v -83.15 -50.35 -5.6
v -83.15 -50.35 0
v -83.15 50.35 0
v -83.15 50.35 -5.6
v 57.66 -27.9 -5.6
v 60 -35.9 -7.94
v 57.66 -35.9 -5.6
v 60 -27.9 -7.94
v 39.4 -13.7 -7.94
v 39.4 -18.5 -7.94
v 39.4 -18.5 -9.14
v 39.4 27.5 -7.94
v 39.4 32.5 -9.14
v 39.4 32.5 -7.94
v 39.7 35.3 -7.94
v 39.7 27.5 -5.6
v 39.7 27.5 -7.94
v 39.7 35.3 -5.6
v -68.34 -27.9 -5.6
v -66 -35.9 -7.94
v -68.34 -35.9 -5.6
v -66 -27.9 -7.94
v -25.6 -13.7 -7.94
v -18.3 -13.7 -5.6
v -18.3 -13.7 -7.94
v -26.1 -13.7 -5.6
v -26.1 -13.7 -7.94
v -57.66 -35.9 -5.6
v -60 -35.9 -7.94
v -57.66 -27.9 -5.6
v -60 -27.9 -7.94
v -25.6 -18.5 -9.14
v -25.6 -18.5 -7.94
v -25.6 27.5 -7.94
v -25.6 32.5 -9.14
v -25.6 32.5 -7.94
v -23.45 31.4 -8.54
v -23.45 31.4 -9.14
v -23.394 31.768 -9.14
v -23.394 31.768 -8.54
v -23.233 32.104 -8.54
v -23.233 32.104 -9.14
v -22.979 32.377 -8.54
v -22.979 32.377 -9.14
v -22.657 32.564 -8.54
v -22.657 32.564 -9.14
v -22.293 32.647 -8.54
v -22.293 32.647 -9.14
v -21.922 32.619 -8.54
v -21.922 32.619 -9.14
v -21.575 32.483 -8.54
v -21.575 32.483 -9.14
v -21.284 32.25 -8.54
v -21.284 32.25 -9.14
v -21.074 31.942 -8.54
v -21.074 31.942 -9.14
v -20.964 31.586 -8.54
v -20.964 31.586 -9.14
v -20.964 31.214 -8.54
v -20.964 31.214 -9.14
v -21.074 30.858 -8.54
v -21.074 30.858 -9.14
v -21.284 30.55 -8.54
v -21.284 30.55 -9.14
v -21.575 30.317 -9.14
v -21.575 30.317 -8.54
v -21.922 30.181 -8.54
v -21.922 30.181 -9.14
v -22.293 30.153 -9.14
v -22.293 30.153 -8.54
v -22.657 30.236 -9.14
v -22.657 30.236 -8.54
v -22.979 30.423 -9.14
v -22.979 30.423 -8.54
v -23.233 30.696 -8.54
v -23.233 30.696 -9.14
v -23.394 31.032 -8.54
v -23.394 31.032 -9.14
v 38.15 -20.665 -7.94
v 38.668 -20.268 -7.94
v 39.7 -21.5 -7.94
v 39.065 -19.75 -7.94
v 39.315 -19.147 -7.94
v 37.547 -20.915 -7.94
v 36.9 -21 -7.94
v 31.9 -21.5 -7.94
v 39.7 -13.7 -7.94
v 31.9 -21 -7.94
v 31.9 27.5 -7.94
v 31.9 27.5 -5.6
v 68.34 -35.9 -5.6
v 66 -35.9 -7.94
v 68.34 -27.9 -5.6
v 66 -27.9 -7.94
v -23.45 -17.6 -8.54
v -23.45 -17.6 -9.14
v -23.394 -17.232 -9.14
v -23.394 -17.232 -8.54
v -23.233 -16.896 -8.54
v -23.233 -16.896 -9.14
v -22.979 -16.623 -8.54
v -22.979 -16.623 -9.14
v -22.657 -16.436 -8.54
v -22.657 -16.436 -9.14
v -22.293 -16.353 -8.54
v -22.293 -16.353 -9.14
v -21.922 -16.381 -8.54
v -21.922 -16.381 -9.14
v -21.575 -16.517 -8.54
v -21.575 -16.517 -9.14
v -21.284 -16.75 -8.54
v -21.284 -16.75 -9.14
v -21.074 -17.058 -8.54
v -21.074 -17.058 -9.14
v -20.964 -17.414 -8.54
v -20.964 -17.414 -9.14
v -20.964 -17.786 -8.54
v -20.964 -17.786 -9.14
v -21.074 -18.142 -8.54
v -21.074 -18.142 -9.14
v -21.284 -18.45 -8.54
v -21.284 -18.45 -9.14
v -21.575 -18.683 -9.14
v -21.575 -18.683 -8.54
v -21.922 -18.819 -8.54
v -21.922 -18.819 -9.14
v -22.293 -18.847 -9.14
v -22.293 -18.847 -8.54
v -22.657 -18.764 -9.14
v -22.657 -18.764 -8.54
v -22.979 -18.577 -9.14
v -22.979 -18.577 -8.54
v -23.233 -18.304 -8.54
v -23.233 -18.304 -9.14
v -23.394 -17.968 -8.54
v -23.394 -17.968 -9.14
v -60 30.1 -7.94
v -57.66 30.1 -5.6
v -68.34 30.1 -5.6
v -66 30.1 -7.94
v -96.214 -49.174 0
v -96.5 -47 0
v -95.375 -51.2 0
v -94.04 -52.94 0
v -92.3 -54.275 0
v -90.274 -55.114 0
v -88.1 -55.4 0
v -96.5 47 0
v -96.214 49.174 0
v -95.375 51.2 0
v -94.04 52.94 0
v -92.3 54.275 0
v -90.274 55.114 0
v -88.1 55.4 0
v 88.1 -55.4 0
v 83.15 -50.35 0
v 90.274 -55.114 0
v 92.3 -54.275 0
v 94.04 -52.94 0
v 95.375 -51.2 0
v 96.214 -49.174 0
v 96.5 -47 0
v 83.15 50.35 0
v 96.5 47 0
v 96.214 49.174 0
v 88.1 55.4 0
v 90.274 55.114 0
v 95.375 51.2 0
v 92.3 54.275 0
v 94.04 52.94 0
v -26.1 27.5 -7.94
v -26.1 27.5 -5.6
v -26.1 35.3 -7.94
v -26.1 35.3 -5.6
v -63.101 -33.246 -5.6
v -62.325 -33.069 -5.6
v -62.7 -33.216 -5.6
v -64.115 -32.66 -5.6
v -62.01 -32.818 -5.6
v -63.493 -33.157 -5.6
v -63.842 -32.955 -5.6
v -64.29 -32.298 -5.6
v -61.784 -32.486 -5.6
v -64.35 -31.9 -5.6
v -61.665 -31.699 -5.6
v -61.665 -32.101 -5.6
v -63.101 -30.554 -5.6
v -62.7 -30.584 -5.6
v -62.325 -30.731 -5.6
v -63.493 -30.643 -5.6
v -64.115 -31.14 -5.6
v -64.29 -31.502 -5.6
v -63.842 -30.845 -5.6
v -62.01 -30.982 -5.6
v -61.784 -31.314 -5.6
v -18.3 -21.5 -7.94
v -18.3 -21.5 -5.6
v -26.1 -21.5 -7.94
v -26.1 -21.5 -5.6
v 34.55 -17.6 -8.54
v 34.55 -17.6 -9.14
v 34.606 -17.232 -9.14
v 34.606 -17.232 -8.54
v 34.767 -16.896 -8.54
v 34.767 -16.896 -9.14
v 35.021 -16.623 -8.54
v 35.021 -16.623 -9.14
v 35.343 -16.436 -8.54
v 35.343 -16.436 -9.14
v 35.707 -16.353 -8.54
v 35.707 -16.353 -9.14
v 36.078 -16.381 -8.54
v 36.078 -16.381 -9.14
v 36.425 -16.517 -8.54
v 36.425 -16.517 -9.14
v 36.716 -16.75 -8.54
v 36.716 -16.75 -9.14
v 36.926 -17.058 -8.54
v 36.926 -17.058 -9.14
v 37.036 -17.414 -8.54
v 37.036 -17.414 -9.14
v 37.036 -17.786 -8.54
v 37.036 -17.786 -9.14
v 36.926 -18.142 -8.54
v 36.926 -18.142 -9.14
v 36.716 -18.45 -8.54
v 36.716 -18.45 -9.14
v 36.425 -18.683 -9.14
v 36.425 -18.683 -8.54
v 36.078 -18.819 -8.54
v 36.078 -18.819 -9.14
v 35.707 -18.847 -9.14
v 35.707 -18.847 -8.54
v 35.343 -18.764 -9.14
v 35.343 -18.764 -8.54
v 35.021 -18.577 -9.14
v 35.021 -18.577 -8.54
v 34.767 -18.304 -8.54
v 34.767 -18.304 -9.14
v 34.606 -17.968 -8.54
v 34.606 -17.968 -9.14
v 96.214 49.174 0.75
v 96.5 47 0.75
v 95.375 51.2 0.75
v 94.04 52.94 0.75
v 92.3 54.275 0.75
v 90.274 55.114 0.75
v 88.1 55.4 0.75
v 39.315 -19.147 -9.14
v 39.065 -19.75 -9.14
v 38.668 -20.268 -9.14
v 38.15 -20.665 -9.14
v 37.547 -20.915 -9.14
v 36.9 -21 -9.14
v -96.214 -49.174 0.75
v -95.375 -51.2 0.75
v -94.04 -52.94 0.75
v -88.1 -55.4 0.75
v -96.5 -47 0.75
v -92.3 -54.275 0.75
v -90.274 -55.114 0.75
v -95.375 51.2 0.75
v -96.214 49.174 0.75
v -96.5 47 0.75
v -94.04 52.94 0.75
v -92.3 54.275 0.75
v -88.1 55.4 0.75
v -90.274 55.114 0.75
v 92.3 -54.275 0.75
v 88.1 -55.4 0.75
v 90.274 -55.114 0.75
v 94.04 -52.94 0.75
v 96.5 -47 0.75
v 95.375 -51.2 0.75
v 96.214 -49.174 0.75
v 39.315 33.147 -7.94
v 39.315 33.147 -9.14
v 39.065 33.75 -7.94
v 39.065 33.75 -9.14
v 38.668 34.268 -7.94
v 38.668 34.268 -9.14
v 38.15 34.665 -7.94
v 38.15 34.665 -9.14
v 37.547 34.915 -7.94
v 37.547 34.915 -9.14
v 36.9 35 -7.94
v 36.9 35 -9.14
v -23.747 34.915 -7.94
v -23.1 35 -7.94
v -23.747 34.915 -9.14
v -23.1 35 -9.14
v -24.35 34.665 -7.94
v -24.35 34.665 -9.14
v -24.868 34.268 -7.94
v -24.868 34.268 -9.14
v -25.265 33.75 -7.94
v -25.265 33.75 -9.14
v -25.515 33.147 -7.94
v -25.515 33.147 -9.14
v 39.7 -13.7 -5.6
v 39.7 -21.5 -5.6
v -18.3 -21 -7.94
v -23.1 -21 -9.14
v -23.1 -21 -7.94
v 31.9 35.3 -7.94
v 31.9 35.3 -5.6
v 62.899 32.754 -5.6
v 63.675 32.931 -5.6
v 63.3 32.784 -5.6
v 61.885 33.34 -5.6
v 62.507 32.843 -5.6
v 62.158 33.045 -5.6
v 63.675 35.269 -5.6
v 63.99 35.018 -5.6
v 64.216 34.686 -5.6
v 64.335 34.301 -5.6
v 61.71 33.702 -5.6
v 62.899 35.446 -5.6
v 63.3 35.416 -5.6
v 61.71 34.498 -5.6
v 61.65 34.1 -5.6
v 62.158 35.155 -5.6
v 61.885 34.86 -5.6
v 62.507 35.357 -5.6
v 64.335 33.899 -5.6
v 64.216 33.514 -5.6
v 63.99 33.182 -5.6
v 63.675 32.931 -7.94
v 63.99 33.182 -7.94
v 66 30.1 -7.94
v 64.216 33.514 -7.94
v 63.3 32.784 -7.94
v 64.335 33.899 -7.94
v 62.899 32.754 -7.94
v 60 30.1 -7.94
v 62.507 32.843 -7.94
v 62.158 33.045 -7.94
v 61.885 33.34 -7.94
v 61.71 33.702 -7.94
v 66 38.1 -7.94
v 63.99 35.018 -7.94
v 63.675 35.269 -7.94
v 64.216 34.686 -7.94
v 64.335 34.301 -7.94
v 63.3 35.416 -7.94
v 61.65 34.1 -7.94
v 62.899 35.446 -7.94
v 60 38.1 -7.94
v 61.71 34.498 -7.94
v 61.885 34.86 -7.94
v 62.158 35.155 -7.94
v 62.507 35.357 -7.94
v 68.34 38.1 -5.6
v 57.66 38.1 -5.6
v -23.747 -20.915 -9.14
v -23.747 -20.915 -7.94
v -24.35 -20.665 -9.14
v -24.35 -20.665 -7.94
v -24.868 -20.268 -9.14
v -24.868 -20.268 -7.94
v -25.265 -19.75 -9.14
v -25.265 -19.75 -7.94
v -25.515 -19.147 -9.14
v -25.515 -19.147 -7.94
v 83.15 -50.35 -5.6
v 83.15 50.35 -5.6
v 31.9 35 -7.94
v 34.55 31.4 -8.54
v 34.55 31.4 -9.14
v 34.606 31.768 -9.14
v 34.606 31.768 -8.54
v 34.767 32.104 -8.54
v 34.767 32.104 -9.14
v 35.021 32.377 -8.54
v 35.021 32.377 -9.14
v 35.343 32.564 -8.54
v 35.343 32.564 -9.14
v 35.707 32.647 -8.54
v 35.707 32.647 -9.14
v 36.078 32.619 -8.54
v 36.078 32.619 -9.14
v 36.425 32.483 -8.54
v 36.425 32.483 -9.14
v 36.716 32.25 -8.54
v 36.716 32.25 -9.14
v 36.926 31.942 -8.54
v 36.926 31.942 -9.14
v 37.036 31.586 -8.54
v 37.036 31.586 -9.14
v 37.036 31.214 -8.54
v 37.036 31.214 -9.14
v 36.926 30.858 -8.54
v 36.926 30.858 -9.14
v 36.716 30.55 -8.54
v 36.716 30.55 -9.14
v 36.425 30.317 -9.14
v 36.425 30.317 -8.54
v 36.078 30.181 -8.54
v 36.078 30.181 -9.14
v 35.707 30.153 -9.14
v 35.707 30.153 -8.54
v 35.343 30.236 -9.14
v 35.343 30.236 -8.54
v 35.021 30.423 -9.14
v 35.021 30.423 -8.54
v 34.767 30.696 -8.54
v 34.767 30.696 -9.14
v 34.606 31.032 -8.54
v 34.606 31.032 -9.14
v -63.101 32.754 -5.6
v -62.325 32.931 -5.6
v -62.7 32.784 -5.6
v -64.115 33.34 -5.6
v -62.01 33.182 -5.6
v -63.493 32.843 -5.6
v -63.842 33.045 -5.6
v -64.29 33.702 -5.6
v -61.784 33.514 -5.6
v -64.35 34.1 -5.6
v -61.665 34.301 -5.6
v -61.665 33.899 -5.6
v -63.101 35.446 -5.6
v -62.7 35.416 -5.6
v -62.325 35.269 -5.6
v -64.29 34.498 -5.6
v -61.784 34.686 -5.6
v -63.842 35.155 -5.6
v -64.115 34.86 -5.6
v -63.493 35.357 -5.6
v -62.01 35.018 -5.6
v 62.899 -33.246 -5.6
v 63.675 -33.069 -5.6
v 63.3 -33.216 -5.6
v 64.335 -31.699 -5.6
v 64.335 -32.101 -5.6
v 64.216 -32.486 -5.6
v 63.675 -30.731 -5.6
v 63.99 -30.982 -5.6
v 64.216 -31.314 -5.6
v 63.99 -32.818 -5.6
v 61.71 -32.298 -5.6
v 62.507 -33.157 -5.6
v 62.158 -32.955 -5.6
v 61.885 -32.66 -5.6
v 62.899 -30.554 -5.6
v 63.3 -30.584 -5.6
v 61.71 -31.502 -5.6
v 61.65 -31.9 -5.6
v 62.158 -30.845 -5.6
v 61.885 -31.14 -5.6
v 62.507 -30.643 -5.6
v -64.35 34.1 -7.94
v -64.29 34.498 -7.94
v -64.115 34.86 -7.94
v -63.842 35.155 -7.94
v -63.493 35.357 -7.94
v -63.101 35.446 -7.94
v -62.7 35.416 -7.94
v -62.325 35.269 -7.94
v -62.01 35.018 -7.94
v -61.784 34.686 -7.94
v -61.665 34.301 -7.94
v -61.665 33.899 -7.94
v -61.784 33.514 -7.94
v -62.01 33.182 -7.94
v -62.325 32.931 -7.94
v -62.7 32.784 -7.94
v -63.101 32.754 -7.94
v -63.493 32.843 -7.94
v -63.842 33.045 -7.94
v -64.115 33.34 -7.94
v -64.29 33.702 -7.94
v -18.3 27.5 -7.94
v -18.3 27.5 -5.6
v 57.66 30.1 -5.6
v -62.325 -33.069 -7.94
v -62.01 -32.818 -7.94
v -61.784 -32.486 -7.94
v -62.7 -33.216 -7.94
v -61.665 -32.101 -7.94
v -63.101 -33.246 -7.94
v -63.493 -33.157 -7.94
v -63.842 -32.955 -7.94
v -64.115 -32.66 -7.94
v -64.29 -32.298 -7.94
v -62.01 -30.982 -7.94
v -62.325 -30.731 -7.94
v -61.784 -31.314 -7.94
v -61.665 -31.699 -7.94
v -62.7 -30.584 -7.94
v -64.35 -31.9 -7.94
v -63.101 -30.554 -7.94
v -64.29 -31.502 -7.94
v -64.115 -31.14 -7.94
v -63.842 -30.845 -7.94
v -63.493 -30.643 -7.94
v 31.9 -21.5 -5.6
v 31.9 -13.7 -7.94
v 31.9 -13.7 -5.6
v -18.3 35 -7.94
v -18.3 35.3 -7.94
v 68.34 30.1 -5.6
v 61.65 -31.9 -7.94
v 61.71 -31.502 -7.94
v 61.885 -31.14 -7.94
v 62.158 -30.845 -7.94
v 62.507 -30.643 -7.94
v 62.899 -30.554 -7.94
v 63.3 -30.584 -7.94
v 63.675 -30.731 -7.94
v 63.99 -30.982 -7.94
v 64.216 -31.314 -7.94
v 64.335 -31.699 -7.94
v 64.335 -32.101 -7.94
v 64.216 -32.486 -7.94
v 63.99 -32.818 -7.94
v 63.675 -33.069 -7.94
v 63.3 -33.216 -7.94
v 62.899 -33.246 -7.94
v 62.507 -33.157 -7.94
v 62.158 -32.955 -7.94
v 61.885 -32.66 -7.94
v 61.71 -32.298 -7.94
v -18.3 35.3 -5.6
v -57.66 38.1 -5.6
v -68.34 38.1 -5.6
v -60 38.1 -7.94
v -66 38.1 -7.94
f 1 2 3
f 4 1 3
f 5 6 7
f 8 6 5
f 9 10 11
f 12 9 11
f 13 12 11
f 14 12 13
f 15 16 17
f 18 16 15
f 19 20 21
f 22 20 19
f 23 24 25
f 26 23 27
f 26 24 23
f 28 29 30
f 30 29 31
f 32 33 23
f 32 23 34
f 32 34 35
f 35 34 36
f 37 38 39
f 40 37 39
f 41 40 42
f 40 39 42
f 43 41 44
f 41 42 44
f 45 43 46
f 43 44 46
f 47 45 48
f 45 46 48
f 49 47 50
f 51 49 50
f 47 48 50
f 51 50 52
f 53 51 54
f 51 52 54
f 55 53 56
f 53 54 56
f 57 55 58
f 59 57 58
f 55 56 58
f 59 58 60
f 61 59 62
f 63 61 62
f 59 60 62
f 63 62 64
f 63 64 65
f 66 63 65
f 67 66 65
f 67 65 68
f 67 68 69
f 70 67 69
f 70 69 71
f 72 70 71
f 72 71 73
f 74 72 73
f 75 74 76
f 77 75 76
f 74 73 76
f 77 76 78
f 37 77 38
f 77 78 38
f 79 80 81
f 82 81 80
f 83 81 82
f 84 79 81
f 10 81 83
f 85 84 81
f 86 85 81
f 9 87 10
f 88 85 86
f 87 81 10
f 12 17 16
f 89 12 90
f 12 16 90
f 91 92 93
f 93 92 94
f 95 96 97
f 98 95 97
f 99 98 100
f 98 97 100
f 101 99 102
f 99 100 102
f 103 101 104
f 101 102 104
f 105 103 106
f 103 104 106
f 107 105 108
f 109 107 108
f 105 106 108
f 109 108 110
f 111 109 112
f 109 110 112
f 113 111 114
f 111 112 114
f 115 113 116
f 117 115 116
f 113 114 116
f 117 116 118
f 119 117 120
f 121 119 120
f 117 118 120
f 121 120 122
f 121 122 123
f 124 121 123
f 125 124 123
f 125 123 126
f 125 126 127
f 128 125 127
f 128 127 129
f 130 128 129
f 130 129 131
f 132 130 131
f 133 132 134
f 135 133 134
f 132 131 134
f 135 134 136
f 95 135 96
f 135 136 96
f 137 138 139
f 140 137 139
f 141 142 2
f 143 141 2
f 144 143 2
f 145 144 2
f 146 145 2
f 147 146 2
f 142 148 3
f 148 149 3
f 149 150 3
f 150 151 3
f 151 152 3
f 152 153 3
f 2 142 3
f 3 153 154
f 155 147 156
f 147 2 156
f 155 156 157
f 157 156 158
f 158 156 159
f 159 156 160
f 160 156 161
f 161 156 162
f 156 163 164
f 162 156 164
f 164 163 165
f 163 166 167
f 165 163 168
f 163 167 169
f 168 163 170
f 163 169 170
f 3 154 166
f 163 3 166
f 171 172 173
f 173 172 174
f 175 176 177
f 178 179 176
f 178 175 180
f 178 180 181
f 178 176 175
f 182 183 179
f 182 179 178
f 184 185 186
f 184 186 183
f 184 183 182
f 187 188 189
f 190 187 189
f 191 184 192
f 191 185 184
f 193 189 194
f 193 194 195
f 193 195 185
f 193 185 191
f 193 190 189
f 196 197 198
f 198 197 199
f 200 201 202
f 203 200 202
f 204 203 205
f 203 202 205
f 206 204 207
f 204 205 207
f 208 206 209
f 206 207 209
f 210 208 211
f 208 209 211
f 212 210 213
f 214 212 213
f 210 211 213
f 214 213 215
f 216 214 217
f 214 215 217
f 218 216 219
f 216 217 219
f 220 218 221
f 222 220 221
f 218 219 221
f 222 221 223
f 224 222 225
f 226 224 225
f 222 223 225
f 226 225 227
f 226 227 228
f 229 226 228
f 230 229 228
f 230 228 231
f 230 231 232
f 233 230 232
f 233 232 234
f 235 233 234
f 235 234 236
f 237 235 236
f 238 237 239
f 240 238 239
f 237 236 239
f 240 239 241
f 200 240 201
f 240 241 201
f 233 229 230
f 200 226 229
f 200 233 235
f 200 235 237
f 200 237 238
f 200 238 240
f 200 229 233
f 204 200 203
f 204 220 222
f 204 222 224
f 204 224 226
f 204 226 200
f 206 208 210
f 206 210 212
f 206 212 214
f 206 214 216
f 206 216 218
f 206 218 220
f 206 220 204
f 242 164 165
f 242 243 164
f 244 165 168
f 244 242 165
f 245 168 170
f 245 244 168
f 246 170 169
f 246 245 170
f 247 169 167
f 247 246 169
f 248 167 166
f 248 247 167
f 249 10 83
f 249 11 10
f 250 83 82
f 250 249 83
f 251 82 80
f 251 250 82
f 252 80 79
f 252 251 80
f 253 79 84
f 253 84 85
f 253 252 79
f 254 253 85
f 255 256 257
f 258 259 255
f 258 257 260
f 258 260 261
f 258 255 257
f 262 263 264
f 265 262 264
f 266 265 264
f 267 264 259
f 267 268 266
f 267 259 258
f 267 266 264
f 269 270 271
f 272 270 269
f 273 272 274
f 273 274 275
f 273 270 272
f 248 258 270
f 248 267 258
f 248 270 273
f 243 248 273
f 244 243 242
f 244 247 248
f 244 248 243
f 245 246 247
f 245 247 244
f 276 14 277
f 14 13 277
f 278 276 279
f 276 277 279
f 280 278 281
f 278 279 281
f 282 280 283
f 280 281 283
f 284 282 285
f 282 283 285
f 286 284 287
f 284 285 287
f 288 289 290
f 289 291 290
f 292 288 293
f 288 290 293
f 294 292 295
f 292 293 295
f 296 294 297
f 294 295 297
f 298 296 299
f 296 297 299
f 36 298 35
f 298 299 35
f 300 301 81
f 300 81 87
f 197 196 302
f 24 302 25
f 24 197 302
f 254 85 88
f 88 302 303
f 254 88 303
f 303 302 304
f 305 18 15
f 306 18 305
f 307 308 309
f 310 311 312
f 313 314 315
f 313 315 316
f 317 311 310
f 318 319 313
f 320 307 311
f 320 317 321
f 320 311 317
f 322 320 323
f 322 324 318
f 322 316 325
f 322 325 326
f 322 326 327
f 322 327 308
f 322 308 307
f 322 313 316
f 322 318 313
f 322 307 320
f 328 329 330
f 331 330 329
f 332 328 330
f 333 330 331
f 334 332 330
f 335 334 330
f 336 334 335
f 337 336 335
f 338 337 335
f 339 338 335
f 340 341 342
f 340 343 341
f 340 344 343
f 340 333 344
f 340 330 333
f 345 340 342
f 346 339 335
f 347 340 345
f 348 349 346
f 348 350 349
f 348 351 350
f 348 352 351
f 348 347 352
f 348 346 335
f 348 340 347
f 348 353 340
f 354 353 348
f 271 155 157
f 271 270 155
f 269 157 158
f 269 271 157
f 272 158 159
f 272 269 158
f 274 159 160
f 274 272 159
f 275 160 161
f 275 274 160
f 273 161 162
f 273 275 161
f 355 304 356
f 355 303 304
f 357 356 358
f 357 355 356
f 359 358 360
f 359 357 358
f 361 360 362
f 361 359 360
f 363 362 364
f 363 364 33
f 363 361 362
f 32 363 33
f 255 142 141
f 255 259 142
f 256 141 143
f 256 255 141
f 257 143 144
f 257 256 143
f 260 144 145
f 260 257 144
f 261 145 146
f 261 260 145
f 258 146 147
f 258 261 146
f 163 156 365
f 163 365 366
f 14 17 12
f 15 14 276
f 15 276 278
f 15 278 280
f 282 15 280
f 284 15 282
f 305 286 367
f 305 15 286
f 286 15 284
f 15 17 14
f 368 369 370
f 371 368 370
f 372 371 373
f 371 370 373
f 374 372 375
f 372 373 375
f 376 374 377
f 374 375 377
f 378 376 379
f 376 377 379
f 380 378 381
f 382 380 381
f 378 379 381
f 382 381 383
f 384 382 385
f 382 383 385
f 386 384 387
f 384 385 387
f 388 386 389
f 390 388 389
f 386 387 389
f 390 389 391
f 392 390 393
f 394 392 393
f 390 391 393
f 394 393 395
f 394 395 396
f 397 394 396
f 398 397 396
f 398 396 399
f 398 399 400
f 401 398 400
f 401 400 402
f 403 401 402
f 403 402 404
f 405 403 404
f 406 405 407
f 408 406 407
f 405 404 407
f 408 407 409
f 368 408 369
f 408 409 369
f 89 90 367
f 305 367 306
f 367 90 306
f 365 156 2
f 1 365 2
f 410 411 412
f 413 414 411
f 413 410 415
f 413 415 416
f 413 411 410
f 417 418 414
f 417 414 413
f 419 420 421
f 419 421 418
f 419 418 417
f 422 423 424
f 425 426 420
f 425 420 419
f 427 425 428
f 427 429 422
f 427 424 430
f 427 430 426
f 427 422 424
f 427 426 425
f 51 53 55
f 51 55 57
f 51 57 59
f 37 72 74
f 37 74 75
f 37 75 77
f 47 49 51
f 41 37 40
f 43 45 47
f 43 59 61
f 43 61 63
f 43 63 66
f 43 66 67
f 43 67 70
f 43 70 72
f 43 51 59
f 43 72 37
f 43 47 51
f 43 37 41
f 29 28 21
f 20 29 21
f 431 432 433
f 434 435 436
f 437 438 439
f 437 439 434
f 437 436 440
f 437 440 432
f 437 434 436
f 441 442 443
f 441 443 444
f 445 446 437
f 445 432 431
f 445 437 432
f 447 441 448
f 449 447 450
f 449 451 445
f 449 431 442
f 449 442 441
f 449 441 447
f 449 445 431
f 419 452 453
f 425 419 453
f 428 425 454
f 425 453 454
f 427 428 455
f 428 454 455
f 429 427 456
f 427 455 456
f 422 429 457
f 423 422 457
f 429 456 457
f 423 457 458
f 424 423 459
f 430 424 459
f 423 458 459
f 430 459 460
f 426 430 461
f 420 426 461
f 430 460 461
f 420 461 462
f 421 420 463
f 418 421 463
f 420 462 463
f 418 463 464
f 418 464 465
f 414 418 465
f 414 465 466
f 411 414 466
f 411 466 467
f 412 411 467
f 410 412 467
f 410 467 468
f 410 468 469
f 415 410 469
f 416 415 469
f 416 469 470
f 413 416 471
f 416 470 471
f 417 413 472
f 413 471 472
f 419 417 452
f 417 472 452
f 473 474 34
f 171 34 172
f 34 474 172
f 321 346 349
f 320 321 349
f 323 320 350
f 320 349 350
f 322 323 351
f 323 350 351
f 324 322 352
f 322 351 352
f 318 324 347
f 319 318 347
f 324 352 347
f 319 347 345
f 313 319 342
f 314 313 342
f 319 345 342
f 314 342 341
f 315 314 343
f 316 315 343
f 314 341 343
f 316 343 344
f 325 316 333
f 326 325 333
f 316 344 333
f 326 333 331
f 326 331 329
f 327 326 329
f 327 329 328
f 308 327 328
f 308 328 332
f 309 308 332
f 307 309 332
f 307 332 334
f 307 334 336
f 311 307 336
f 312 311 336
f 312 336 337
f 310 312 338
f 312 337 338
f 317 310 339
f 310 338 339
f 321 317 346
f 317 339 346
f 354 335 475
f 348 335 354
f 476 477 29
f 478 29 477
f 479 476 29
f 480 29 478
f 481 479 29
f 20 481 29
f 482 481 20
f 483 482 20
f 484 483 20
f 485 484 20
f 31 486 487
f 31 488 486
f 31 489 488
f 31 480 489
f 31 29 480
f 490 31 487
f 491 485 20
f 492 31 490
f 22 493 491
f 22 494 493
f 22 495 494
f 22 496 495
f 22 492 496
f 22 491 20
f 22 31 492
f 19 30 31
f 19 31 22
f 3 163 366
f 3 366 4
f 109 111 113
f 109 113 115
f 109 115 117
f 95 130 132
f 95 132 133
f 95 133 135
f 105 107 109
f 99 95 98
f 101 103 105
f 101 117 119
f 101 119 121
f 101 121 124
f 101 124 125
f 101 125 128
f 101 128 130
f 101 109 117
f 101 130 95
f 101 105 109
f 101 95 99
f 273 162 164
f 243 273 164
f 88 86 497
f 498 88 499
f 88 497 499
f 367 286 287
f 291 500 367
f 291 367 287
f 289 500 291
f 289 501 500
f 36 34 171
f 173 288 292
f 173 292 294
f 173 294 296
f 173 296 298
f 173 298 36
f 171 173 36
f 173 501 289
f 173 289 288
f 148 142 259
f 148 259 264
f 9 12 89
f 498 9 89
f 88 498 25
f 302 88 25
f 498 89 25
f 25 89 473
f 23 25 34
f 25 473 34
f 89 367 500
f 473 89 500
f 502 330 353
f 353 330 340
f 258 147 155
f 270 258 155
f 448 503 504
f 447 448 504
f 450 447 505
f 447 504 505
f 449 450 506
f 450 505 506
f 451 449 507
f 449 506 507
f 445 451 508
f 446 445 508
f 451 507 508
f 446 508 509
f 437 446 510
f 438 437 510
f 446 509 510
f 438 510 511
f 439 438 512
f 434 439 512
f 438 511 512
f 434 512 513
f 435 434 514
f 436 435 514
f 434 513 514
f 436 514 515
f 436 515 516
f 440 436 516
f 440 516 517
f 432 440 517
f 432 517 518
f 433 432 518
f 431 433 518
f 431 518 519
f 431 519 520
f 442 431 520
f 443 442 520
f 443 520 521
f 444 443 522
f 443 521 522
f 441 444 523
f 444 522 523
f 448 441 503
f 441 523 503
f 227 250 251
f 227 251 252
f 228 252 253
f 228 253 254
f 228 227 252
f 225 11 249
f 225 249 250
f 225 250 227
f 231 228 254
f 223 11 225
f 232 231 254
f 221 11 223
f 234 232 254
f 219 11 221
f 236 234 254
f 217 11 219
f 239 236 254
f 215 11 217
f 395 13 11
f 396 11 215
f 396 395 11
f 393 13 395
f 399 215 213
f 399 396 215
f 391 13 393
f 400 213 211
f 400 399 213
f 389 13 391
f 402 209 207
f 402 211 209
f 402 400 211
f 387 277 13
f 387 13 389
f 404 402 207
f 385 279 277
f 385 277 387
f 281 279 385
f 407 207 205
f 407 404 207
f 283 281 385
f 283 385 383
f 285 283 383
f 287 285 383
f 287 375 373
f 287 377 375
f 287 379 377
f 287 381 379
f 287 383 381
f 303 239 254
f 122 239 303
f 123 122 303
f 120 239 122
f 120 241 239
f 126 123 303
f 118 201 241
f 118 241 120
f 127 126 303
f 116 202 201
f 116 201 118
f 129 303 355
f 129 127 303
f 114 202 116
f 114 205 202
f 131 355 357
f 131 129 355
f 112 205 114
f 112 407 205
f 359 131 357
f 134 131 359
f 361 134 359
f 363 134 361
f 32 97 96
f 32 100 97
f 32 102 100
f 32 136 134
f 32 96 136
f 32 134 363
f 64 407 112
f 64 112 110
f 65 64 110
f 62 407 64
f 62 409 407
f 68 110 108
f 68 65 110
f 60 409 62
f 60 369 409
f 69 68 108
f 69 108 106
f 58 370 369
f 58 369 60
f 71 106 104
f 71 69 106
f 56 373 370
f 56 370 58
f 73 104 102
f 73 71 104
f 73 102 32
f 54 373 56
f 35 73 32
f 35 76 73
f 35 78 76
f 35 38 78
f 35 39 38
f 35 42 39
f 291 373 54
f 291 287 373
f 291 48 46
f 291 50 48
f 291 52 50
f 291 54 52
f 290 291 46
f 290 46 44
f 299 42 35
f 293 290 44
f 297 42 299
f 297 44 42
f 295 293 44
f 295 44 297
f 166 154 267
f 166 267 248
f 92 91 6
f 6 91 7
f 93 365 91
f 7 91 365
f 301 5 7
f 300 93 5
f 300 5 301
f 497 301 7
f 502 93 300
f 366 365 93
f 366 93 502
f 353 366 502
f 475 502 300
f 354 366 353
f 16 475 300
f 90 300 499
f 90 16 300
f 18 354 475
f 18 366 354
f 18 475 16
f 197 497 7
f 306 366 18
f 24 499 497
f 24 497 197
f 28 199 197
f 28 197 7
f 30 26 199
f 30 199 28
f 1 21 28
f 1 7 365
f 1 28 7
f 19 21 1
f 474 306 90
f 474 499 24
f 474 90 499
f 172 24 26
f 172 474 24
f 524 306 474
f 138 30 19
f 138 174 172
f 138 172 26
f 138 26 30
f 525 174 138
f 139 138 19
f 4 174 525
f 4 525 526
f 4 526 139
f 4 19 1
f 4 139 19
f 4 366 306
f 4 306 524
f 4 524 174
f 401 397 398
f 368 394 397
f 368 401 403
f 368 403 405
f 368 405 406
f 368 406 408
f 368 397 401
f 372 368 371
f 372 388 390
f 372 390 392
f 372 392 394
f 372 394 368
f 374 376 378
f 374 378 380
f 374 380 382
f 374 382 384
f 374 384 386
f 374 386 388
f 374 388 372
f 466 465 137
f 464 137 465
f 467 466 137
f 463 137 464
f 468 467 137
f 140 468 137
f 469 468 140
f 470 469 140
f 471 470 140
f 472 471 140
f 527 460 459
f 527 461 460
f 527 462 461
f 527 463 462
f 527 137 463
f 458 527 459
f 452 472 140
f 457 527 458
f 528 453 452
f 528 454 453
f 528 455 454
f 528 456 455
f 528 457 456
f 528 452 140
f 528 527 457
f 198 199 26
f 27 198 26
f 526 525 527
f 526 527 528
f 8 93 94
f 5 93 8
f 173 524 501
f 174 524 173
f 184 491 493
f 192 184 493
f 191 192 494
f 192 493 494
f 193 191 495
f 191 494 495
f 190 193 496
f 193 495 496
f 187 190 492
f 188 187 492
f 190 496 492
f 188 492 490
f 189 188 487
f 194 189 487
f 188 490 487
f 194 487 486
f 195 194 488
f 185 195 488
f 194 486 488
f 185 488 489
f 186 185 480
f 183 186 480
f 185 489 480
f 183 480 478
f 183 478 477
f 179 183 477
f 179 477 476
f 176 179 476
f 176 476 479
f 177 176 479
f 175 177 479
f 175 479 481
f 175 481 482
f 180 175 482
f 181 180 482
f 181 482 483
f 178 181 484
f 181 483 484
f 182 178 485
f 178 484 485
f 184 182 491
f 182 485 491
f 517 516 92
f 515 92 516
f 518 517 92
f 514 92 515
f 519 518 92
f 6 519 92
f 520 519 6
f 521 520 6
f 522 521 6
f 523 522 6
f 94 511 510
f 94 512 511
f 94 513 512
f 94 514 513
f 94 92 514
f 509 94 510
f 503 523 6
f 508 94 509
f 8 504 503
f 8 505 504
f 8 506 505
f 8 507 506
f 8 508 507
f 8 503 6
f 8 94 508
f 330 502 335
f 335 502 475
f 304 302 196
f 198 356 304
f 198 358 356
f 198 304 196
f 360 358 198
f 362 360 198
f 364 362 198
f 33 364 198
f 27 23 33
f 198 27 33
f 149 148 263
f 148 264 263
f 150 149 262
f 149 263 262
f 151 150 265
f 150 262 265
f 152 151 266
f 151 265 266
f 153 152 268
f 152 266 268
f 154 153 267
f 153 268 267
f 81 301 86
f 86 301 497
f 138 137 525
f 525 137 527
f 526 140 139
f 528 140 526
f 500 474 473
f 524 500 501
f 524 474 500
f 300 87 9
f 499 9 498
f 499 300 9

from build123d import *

# Parameters (mm, degrees)
SKETCH_1_W          = 193
SKETCH_1_H          = 110.8
EXTRUDE_1_DEPTH     = 0.75
FILLET_1_R          = 8.4
SKETCH_2_W          = 166.3
SKETCH_2_H          = 100.7
EXTRUDE_2_DEPTH     = 5.6
SKETCH_3_W          = 6
SKETCH_3_H          = 8
EXTRUDE_3_DEPTH     = 2.34
CHAMFER_1_SIZE      = 2.34
SKETCH_4_R          = 1.35
CUT_EXTRUDE_1_DEPTH = 2.34
SKETCH_5_W          = 7.8
SKETCH_5_H          = 7.8
EXTRUDE_4_DEPTH     = 2.34
SKETCH_6_W          = 65
SKETCH_6_H          = 56
EXTRUDE_5_DEPTH     = 1.2
FILLET_2_R          = 2.5
SKETCH_7_R          = 1.25
CUT_EXTRUDE_2_DEPTH = 0.6


with BuildPart() as part:
    # 草图1 → 凸台-拉伸1 (new body)
    with BuildSketch(Plane.XY):
        Rectangle(SKETCH_1_W, SKETCH_1_H)
    extrude(amount=EXTRUDE_1_DEPTH)

    # 圆角1
    fillet_1_edges = [part.edges().sort_by_distance(p)[0] for p in [
        (96.5, -55.4, 0.375),
        (-96.5, -55.4, 0.375),
        (-96.5, 55.4, 0.375),
        (96.5, 55.4, 0.375),
    ]]
    fillet(fillet_1_edges, radius=FILLET_1_R)

    # 草图2 → 凸台-拉伸2 (add)
    with BuildSketch(Plane(origin=(0, 0, 0), x_dir=(-1, 0, 0), z_dir=(0, 0, -1))):
        Rectangle(SKETCH_2_W, SKETCH_2_H)
    extrude(amount=EXTRUDE_2_DEPTH)

    # 草图3 → 凸台-拉伸3 (add)
    with BuildSketch(Plane(origin=(0, 0, -5.6), x_dir=(-1, 0, 0), z_dir=(0, 0, -1))):
        with Locations((-63, 34.1)):
            Rectangle(SKETCH_3_W, SKETCH_3_H)
        with Locations((-63, -31.9)):
            Rectangle(SKETCH_3_W, SKETCH_3_H)
        with Locations((63, 34.1)):
            Rectangle(SKETCH_3_W, SKETCH_3_H)
        with Locations((63, -31.9)):
            Rectangle(SKETCH_3_W, SKETCH_3_H)
    extrude(amount=EXTRUDE_3_DEPTH)

    # 倒角1
    chamfer_1_edges = [part.edges().sort_by_distance(p)[0] for p in [
        (66, -31.9, -5.6),
        (60, -31.9, -5.6),
        (-66, -31.9, -5.6),
        (-60, -31.9, -5.6),
        (-60, 34.1, -5.6),
        (-66, 34.1, -5.6),
        (60, 34.1, -5.6),
        (66, 34.1, -5.6),
    ]]
    chamfer(chamfer_1_edges, length=CHAMFER_1_SIZE - 0.0001)  # a hair under: the kernel refuses the full size

    # 草图4 → 切除-拉伸1 (cut)
    with BuildSketch(Plane(origin=(0, 0, -7.94), x_dir=(-1, 0, 0), z_dir=(0, 0, -1))):
        with Locations((-63, 34.1)):
            Circle(SKETCH_4_R)
        with Locations((-63, -31.9)):
            Circle(SKETCH_4_R)
        with Locations((63, -31.9)):
            Circle(SKETCH_4_R)
        with Locations((63, 34.1)):
            Circle(SKETCH_4_R)
    extrude(amount=-CUT_EXTRUDE_1_DEPTH, mode=Mode.SUBTRACT)

    # 草图5 → 凸台-拉伸4 (add)
    with BuildSketch(Plane(origin=(0, 0, -5.6), x_dir=(-1, 0, 0), z_dir=(0, 0, -1))):
        with Locations((-35.8, 31.4)):
            Rectangle(SKETCH_5_W, SKETCH_5_H)
        with Locations((22.2, 31.4)):
            Rectangle(SKETCH_5_W, SKETCH_5_H)
        with Locations((-35.8, -17.6)):
            Rectangle(SKETCH_5_W, SKETCH_5_H)
        with Locations((22.2, -17.6)):
            Rectangle(SKETCH_5_W, SKETCH_5_H)
    extrude(amount=EXTRUDE_4_DEPTH)

    # 草图6 → 凸台-拉伸5 (add)
    with BuildSketch(Plane(origin=(0, 0, -7.94), x_dir=(-1, 0, 0), z_dir=(0, 0, -1))):
        with Locations((-6.9, 7)):
            Rectangle(SKETCH_6_W, SKETCH_6_H)
    extrude(amount=EXTRUDE_5_DEPTH)

    # 圆角2
    fillet_2_edges = [part.edges().sort_by_distance(p)[0] for p in [
        (-25.6, -21, -8.54),
        (-25.6, 35, -8.54),
        (39.4, 35, -8.54),
        (39.4, -21, -8.54),
    ]]
    fillet(fillet_2_edges, radius=FILLET_2_R)

    # 草图7 → 切除-拉伸2 (cut)
    with BuildSketch(Plane(origin=(0, 0, -9.14), x_dir=(-1, 0, 0), z_dir=(0, 0, -1))):
        with Locations((-35.8, 31.4)):
            Circle(SKETCH_7_R)
        with Locations((22.2, 31.4)):
            Circle(SKETCH_7_R)
        with Locations((-35.8, -17.6)):
            Circle(SKETCH_7_R)
        with Locations((22.2, -17.6)):
            Circle(SKETCH_7_R)
    extrude(amount=-CUT_EXTRUDE_2_DEPTH, mode=Mode.SUBTRACT)


solid = part.part
